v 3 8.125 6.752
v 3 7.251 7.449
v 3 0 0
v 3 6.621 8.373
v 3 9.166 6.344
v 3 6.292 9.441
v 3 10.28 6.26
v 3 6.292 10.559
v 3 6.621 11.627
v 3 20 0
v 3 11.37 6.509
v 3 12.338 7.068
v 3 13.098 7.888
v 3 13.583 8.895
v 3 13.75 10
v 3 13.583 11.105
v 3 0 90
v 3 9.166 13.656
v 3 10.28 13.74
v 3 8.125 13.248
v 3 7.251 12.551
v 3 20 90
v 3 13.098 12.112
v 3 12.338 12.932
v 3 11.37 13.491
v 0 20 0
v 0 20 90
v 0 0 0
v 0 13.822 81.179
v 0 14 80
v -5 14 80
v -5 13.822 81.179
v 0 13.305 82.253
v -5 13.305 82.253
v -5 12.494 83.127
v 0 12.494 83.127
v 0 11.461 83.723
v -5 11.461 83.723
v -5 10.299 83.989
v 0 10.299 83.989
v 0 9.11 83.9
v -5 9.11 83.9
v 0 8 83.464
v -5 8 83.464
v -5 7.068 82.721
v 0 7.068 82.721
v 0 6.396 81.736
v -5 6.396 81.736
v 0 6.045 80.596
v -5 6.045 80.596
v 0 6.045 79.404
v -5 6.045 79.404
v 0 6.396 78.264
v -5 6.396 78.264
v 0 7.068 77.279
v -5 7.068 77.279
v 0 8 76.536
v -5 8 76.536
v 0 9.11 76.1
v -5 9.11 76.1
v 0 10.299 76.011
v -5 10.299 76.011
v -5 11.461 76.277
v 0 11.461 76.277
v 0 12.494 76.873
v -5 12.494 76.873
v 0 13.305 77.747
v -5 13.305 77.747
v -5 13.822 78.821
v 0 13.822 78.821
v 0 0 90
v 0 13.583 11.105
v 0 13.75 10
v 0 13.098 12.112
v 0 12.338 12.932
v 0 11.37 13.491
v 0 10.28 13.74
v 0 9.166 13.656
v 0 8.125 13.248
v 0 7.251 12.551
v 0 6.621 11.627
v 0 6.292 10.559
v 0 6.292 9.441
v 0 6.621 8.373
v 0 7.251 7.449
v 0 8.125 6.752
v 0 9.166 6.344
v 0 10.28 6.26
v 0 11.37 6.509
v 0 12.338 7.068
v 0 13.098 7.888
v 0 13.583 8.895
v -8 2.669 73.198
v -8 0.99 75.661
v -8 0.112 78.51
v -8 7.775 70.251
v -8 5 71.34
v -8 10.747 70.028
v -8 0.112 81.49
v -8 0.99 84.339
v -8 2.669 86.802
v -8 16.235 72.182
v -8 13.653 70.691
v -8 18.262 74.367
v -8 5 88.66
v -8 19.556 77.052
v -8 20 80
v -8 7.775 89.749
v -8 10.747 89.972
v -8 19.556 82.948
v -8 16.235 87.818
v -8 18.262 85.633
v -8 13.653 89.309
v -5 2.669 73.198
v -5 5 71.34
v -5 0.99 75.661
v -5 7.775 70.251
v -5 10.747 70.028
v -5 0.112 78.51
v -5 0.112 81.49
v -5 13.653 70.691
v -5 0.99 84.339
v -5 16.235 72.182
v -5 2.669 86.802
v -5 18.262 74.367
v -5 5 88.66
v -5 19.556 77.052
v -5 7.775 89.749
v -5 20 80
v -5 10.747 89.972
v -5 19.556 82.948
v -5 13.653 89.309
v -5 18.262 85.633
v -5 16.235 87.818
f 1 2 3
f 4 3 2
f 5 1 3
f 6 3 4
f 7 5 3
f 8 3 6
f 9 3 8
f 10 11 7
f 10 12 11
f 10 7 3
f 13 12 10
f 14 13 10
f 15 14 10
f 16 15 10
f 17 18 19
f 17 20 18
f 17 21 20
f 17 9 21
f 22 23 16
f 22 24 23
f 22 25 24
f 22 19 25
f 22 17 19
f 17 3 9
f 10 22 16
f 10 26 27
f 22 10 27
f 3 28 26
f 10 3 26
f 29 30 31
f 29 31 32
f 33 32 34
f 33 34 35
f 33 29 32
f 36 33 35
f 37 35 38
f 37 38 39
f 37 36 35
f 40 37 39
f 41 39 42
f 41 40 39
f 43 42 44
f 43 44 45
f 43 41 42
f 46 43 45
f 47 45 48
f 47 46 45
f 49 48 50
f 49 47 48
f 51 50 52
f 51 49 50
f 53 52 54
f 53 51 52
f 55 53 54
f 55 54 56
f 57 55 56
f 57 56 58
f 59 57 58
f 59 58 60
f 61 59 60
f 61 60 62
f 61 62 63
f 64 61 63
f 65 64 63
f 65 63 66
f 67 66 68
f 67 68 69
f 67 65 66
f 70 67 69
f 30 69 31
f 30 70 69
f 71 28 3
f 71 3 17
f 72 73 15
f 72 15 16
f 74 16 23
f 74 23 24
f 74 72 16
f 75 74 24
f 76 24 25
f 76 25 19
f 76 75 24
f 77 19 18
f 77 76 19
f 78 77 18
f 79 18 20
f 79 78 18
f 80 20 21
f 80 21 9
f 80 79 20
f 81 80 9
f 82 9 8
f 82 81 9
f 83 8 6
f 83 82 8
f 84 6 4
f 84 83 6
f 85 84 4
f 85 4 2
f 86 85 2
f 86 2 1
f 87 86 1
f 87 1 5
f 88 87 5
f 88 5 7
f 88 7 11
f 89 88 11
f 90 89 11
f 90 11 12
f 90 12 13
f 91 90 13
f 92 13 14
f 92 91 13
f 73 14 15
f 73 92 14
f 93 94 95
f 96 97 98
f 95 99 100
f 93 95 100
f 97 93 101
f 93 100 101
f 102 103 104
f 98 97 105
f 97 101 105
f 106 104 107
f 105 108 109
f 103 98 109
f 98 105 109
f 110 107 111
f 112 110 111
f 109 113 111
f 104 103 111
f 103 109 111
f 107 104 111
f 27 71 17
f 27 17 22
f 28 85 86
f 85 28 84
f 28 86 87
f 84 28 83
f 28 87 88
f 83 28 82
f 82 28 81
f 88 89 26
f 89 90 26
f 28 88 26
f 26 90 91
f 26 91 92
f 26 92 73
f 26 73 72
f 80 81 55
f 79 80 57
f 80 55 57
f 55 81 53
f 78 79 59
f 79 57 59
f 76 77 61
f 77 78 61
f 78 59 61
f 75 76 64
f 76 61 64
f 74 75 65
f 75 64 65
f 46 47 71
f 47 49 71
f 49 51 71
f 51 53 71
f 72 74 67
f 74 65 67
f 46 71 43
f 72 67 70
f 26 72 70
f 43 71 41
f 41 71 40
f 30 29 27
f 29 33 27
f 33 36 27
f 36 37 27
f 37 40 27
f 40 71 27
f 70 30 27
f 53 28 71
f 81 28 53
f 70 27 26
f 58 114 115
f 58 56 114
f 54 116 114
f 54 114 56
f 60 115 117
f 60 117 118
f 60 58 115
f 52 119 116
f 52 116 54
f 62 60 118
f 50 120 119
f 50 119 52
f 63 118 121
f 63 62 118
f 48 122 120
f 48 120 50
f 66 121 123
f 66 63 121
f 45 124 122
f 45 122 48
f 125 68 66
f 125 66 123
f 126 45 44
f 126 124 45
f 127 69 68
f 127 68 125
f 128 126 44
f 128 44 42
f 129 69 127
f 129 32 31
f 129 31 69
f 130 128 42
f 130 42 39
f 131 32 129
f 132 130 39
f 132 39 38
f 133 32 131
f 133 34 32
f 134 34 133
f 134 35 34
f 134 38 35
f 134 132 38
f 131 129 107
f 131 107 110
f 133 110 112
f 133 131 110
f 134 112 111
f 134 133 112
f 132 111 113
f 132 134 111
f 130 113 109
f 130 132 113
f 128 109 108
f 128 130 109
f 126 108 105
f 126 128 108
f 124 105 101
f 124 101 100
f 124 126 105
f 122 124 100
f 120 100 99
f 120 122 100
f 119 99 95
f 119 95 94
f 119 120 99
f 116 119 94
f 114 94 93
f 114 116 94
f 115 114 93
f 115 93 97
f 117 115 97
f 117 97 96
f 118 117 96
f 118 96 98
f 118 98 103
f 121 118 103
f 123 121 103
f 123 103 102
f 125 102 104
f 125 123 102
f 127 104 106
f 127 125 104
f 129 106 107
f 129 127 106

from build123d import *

# Parameters (mm, degrees)
F0_W     = 20
F0_H     = 90
F0_R     = 3.75
F0_R_2   = 4
F1_DEPTH = 3
F2_DEPTH = 5
F4_R     = 10
F5_DEPTH = 3


with BuildPart() as f1:
    # F0 (on Right) → F1 (new body)
    with BuildSketch(Plane.YZ):
        with Locations((10, 45)):
            Rectangle(F0_W, F0_H)
        with Locations((10, 10)):
            Circle(F0_R, mode=Mode.SUBTRACT)
        with Locations((10, 80)):
            Circle(F0_R_2, mode=Mode.SUBTRACT)
        with Locations((10, 80)):
            Circle(F0_R_2)
    extrude(amount=F1_DEPTH)

    # F0 (on Right) → F2 (join)
    with BuildSketch(Plane.YZ):
        with Locations((10, 80)):
            Circle(F0_R_2)
    extrude(amount=-F2_DEPTH)

    # F4 (on offset) → F5 (join)
    with BuildSketch(Plane.YZ.offset(-5)):
        with Locations((10, 80)):
            Circle(F4_R)
    extrude(amount=-F5_DEPTH)


solid = f1.part
